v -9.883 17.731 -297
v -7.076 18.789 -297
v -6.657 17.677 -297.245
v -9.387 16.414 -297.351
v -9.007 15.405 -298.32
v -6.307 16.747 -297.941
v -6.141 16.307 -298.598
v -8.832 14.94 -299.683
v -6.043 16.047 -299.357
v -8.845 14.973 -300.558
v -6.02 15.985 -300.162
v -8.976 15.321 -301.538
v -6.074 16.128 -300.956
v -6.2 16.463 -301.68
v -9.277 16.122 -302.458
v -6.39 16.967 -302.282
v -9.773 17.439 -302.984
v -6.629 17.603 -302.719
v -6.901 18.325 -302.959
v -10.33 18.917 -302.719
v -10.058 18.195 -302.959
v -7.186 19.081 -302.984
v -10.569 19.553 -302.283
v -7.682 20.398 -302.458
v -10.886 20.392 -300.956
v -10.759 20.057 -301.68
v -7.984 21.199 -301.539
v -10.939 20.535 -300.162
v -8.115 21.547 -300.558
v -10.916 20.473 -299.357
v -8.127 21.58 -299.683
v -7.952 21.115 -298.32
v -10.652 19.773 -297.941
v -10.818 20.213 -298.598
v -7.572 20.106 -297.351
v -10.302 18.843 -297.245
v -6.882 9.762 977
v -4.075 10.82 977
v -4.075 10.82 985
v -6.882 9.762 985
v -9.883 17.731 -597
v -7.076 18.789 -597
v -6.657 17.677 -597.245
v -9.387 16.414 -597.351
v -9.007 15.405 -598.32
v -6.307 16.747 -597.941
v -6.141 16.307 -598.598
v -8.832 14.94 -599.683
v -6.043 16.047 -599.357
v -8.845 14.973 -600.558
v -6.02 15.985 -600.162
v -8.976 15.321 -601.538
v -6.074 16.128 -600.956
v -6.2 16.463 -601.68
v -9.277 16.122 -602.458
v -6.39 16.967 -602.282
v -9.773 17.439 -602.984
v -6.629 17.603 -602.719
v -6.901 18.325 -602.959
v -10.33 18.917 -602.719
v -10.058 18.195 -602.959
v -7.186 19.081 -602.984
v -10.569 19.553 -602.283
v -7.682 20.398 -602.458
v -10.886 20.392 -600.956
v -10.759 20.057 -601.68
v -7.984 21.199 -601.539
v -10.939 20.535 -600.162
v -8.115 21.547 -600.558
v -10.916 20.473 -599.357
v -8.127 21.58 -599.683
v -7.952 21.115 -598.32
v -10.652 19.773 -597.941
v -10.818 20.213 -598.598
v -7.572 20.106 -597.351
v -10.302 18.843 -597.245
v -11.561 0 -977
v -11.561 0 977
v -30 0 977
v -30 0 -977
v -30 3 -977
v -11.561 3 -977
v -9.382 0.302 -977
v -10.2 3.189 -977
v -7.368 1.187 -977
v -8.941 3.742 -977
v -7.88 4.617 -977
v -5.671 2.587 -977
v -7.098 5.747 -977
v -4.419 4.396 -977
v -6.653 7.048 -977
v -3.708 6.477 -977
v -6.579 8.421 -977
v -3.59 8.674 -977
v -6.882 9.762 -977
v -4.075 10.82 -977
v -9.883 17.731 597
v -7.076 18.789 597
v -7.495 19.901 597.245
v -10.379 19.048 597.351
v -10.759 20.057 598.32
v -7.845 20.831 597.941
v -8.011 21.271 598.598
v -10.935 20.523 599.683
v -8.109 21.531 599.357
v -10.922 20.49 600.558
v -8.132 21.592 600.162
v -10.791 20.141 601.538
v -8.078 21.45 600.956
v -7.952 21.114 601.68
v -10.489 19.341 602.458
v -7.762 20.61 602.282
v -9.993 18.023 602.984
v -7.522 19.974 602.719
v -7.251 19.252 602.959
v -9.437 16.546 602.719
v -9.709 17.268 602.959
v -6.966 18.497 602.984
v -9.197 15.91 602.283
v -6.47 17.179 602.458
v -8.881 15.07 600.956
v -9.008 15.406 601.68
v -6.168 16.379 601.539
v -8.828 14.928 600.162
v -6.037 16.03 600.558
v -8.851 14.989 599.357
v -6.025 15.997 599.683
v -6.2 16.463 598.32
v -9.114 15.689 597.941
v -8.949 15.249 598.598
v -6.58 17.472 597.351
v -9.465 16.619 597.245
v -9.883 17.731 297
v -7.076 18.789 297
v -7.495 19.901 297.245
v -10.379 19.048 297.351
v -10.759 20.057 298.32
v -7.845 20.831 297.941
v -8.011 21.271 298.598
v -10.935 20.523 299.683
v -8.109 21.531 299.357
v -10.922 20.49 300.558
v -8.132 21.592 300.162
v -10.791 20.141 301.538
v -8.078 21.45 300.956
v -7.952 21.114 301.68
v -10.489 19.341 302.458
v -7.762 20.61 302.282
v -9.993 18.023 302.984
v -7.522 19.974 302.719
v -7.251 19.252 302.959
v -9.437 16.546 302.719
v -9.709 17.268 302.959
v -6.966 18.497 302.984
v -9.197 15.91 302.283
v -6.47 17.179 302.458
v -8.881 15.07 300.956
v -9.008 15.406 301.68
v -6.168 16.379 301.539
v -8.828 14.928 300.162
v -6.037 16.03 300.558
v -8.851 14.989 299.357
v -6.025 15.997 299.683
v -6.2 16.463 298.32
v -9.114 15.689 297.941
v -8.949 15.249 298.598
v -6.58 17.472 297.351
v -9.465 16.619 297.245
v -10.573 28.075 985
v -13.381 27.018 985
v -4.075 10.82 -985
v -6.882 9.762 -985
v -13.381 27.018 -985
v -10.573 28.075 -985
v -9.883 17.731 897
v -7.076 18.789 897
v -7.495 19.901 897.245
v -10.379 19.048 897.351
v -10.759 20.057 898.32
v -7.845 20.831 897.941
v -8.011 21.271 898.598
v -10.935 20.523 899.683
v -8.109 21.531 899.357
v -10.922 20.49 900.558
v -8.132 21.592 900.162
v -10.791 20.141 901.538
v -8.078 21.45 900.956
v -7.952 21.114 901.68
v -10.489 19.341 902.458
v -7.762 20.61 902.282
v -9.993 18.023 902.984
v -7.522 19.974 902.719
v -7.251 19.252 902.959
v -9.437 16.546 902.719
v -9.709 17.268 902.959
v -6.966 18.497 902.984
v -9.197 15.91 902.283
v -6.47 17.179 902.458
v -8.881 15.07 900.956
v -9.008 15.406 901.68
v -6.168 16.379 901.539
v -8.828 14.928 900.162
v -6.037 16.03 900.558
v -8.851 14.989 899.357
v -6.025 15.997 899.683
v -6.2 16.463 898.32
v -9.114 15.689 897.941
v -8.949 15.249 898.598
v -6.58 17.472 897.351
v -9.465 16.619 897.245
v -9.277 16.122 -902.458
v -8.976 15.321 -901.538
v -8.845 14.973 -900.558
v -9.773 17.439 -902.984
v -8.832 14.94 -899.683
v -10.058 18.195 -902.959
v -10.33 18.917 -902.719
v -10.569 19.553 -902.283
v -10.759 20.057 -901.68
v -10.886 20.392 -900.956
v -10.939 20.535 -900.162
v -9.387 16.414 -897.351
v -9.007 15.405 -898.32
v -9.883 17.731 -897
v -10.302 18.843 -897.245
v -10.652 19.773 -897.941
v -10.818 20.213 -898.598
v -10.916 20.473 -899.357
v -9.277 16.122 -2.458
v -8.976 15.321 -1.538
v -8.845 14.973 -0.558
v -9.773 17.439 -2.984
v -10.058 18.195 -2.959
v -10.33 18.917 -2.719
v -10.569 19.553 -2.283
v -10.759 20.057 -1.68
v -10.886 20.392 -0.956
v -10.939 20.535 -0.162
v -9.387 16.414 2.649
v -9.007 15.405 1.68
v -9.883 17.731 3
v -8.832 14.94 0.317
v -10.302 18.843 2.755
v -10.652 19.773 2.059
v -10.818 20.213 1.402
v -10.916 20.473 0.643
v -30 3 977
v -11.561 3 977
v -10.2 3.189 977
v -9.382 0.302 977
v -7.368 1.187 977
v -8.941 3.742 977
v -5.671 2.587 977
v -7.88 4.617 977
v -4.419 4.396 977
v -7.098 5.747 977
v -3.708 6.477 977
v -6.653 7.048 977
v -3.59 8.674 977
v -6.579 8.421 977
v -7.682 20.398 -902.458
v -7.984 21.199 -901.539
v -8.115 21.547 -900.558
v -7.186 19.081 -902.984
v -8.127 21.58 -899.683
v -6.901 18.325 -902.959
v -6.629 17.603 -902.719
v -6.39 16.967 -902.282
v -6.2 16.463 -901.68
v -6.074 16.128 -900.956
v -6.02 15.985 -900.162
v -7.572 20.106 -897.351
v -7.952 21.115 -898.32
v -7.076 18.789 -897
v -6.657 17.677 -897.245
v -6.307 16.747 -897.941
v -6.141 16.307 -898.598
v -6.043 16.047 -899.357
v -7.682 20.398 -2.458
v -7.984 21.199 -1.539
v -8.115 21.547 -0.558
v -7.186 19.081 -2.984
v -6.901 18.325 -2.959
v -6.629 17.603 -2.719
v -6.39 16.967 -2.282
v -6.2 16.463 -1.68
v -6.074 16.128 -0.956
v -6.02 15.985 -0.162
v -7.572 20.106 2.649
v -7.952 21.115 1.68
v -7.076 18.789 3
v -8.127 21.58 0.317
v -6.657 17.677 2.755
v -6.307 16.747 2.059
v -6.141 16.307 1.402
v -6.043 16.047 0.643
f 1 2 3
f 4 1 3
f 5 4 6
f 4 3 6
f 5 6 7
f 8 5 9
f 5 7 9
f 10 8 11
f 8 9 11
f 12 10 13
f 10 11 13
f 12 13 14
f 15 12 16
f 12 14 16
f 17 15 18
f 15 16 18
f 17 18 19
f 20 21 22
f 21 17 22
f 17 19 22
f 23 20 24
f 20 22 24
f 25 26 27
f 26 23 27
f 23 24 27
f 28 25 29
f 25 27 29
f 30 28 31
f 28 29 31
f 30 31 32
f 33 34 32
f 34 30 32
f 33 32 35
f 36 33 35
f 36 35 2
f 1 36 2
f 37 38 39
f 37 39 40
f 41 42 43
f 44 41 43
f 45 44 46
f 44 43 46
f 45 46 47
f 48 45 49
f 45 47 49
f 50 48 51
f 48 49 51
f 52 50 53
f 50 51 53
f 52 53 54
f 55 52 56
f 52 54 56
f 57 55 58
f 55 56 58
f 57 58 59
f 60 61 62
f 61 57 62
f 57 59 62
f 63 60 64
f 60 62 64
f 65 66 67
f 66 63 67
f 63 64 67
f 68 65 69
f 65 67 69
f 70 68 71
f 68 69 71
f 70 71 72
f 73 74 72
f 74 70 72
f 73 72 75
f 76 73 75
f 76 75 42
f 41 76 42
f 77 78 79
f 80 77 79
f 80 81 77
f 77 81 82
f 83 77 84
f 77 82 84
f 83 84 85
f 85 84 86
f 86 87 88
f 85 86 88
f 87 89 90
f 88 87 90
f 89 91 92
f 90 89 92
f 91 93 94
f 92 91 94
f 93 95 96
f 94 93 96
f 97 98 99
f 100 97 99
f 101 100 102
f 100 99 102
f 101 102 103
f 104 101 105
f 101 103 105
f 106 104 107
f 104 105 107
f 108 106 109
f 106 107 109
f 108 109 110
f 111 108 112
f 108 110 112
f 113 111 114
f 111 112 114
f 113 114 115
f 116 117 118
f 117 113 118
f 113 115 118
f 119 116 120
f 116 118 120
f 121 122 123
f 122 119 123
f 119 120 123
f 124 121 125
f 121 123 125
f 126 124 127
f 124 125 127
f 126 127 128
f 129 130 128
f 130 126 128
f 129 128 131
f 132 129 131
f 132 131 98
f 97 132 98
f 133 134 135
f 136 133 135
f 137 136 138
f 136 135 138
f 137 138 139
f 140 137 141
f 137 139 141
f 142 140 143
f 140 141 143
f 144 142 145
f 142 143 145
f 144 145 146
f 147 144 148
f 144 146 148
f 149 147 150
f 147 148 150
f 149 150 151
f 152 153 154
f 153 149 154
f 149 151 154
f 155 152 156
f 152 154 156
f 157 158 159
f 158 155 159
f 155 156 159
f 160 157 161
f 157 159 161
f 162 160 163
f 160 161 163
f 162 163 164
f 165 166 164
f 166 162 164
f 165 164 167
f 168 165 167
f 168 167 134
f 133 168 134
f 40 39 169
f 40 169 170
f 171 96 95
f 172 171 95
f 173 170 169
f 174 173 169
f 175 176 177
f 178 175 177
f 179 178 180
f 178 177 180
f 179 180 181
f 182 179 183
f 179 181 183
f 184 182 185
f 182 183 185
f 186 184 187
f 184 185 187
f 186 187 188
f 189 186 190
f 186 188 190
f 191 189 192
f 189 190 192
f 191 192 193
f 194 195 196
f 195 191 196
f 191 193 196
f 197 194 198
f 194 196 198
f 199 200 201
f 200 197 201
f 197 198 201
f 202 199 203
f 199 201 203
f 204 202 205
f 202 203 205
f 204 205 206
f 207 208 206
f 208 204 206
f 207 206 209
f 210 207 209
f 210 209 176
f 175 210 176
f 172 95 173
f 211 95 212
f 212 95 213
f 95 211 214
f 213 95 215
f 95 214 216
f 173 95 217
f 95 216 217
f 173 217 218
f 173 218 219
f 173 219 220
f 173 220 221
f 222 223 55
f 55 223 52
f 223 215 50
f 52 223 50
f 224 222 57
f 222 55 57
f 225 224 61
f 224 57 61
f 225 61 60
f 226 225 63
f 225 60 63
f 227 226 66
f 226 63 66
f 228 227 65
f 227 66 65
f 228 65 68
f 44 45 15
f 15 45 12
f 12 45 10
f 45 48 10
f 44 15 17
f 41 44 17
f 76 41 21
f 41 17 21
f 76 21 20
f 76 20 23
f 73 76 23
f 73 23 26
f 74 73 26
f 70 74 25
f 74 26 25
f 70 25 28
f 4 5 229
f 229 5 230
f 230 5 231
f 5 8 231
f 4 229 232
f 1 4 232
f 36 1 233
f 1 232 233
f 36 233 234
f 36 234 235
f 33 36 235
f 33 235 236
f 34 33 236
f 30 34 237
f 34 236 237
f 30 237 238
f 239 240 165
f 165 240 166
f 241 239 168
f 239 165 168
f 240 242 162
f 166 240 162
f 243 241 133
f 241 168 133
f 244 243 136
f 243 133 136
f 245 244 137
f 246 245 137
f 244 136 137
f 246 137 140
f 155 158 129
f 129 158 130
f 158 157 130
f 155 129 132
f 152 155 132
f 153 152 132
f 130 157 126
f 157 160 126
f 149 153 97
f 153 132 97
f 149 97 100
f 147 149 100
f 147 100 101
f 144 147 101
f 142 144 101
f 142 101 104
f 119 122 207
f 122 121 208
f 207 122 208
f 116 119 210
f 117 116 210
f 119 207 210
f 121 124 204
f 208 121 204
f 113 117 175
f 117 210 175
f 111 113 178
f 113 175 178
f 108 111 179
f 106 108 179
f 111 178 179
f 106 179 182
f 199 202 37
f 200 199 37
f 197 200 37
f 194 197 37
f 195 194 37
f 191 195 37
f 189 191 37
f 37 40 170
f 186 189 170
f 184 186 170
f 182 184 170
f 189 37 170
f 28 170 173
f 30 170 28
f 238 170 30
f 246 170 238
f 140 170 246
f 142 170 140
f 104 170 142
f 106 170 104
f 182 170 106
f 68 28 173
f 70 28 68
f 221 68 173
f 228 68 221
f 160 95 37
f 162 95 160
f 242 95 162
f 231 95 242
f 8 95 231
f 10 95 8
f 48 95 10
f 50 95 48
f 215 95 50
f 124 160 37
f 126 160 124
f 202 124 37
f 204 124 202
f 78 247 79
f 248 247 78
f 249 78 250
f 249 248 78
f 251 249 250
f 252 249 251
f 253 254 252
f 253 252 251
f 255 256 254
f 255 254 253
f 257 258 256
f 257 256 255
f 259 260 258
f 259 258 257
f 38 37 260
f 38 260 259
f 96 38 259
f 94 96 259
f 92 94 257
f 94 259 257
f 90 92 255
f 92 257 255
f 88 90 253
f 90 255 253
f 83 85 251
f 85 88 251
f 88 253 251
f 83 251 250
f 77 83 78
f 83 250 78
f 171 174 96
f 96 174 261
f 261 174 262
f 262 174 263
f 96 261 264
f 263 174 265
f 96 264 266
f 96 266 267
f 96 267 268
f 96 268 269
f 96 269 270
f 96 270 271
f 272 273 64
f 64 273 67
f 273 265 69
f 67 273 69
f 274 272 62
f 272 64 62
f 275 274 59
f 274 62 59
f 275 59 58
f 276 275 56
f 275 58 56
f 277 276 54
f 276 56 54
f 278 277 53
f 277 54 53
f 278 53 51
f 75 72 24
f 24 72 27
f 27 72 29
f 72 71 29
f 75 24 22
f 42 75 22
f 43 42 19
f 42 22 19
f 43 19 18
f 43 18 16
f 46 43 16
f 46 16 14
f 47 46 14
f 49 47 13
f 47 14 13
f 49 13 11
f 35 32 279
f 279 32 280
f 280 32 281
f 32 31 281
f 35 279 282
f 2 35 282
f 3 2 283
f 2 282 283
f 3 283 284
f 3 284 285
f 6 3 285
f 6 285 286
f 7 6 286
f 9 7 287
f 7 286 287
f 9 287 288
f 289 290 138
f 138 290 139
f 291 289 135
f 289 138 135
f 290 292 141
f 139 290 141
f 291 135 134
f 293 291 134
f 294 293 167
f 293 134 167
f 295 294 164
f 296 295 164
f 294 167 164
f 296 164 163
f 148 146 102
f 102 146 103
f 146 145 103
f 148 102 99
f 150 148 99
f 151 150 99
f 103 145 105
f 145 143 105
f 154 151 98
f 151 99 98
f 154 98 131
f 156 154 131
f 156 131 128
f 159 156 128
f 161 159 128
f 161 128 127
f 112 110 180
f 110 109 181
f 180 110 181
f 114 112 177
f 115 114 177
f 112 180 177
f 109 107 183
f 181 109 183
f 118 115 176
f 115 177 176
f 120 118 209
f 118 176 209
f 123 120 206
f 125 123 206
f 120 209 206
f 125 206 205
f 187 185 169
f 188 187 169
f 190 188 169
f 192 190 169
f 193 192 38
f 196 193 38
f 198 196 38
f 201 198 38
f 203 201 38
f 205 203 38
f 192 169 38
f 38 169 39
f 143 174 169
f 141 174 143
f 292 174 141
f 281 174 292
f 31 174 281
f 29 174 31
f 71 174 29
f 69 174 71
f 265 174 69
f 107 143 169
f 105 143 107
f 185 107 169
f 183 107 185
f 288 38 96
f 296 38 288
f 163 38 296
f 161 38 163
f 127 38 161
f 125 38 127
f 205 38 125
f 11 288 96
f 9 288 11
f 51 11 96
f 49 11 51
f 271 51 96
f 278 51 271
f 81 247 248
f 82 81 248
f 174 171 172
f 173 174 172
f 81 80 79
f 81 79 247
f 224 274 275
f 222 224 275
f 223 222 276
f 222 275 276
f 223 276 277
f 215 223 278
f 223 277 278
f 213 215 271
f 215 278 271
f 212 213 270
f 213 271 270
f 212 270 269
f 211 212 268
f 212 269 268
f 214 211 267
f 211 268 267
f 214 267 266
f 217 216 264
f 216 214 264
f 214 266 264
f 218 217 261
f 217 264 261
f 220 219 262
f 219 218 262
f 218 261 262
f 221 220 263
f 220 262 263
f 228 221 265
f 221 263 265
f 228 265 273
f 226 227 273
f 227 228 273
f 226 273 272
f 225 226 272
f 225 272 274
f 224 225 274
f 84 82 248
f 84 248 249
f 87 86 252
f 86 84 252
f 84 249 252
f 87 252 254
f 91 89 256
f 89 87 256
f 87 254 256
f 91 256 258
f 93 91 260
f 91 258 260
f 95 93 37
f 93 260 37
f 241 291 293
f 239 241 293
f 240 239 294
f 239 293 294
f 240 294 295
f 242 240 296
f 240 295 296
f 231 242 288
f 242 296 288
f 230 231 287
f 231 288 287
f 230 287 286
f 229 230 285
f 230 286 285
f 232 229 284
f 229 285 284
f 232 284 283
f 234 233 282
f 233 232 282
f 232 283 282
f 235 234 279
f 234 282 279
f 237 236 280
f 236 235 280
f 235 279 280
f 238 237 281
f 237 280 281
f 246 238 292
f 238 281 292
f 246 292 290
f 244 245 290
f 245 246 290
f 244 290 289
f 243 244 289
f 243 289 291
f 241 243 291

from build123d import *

# Parameters (mm, degrees)
SM_BASE_FLANGE_1_DEPTH = 985
CUT_EXTRUDE_START      = 977
CUT_EXTRUDE_1_DEPTH    = 8
CUT_EXTRUDE_2_REACH    = 987.857
SKETCH_4_RX            = 3
SKETCH_4_RY            = 2.999814796


# Read off the part's stored shape, not the designer's step: Вырез-Вытянуть1
# Sheet-metal steps are written as plain solids
with BuildPart() as part:
    # Sketch 1 → Базовая кромка1 (new, symmetric)
    with BuildSketch(Plane.XY):
        with BuildLine():
            Line((-10.573213138, 28.075027408), (-4.074693371, 10.819523503))
            ThreePointArc((-4.074693371, 10.819523503), (-4.982758525, 3.447867974), (-11.561367346, 0))
            Line((-11.561367346, 0), (-30, 0))
            Line((-30, 0), (-30, 3))
            Line((-30, 3), (-11.561367346, 3))
            ThreePointArc((-11.561367346, 3), (-7.449736833, 5.154917483), (-6.882196111, 9.76220219))
            Line((-6.882196111, 9.76220219), (-13.380715879, 27.017706094))
            Line((-13.380715879, 27.017706094), (-10.573213138, 28.075027408))
        make_face()
    extrude(amount=SM_BASE_FLANGE_1_DEPTH, both=True)

    # Вырез-Вытянуть1 outline → Вырез-Вытянуть1 (cut)
    with BuildSketch(Plane.XY.offset(CUT_EXTRUDE_START)):
        with BuildLine():
            Line((-4.074693371, 10.819523503), (-6.882196111, 9.76220219))
            ThreePointArc((-6.882196111, 9.76220219), (-7.449736833, 5.154917483), (-11.561367346, 3))
            Line((-11.561367346, 3), (-30, 3))
            Line((-30, 3), (-30, 0))
            Line((-30, 0), (-11.561367346, 0))
            ThreePointArc((-11.561367346, 0), (-4.982758526, 3.447867973), (-4.074693371, 10.819523503))
        make_face()
    cut_extrude_1 = extrude(amount=CUT_EXTRUDE_1_DEPTH, mode=Mode.SUBTRACT)

    # Зеркальное отражение1: Вырез-Вытянуть1 across plane
    add(cut_extrude_1.mirror(Plane.XY), mode=Mode.SUBTRACT)

    # Эскиз4 → Вырез-Вытянуть2 (cut, up to next)
    with BuildSketch(Plane(origin=(0, 0, 0), x_dir=(0, 0, -1), z_dir=(0.9358342469192185, 0.3524404379368797, 0)), mode=Mode.PRIVATE) as cut_extrude_2_sk1:
        with Locations(Location((600, 20.076859002), (0, 0, 180))):
            Ellipse(SKETCH_4_RX, SKETCH_4_RY)
    cut_extrude_2_tool1 = extrude(cut_extrude_2_sk1.sketch, amount=-CUT_EXTRUDE_2_REACH, mode=Mode.PRIVATE) & part.part
    # Эскиз4 → Вырез-Вытянуть2 (cut, up to next)
    with BuildSketch(Plane(origin=(0, 0, 0), x_dir=(0, 0, -1), z_dir=(0.9358342469192185, 0.3524404379368797, 0)), mode=Mode.PRIVATE) as cut_extrude_2_sk2:
        with Locations(Location((300, 20.076859002), (0, 0, 180))):
            Ellipse(SKETCH_4_RX, SKETCH_4_RY)
    cut_extrude_2_tool2 = extrude(cut_extrude_2_sk2.sketch, amount=-CUT_EXTRUDE_2_REACH, mode=Mode.PRIVATE) & part.part
    # Эскиз4 → Вырез-Вытянуть2 (cut, up to next)
    with BuildSketch(Plane(origin=(0, 0, 0), x_dir=(0, 0, -1), z_dir=(0.9358342469192185, 0.3524404379368797, 0)), mode=Mode.PRIVATE) as cut_extrude_2_sk3:
        with Locations(Location((0, 20.076859002), (0, 0, 180))):
            Ellipse(SKETCH_4_RX, SKETCH_4_RY)
    cut_extrude_2_tool3 = extrude(cut_extrude_2_sk3.sketch, amount=-CUT_EXTRUDE_2_REACH, mode=Mode.PRIVATE) & part.part
    # Эскиз4 → Вырез-Вытянуть2 (cut, up to next)
    with BuildSketch(Plane(origin=(0, 0, 0), x_dir=(0, 0, -1), z_dir=(0.9358342469192185, 0.3524404379368797, 0)), mode=Mode.PRIVATE) as cut_extrude_2_sk4:
        with Locations((-300, 20.076859002)):
            Ellipse(SKETCH_4_RX, SKETCH_4_RY)
    cut_extrude_2_tool4 = extrude(cut_extrude_2_sk4.sketch, amount=-CUT_EXTRUDE_2_REACH, mode=Mode.PRIVATE) & part.part
    # Эскиз4 → Вырез-Вытянуть2 (cut, up to next)
    with BuildSketch(Plane(origin=(0, 0, 0), x_dir=(0, 0, -1), z_dir=(0.9358342469192185, 0.3524404379368797, 0)), mode=Mode.PRIVATE) as cut_extrude_2_sk5:
        with Locations((-600, 20.076859002)):
            Ellipse(SKETCH_4_RX, SKETCH_4_RY)
    cut_extrude_2_tool5 = extrude(cut_extrude_2_sk5.sketch, amount=-CUT_EXTRUDE_2_REACH, mode=Mode.PRIVATE) & part.part
    # Эскиз4 → Вырез-Вытянуть2 (cut, up to next)
    with BuildSketch(Plane(origin=(0, 0, 0), x_dir=(0, 0, -1), z_dir=(0.9358342469192185, 0.3524404379368797, 0)), mode=Mode.PRIVATE) as cut_extrude_2_sk6:
        with Locations((-900, 20.076859002)):
            Ellipse(SKETCH_4_RX, SKETCH_4_RY)
    cut_extrude_2_tool6 = extrude(cut_extrude_2_sk6.sketch, amount=-CUT_EXTRUDE_2_REACH, mode=Mode.PRIVATE) & part.part
    # Эскиз4 → Вырез-Вытянуть2 (cut, up to next)
    with BuildSketch(Plane(origin=(0, 0, 0), x_dir=(0, 0, -1), z_dir=(0.9358342469192185, 0.3524404379368797, 0)), mode=Mode.PRIVATE) as cut_extrude_2_sk7:
        with Locations(Location((900, 20.076859002), (0, 0, 180))):
            Ellipse(SKETCH_4_RX, SKETCH_4_RY)
    cut_extrude_2_tool7 = extrude(cut_extrude_2_sk7.sketch, amount=-CUT_EXTRUDE_2_REACH, mode=Mode.PRIVATE) & part.part
    add(cut_extrude_2_tool1.solids().sort_by_distance((-7.075897, 18.788612, -600))[0], mode=Mode.SUBTRACT)
    add(cut_extrude_2_tool2.solids().sort_by_distance((-7.075897, 18.788612, -300))[0], mode=Mode.SUBTRACT)
    add(cut_extrude_2_tool3.solids().sort_by_distance((-7.075897, 18.788612, 0))[0], mode=Mode.SUBTRACT)
    add(cut_extrude_2_tool4.solids().sort_by_distance((-7.075897, 18.788612, 300))[0], mode=Mode.SUBTRACT)
    add(cut_extrude_2_tool5.solids().sort_by_distance((-7.075897, 18.788612, 600))[0], mode=Mode.SUBTRACT)
    add(cut_extrude_2_tool6.solids().sort_by_distance((-7.075897, 18.788612, 900))[0], mode=Mode.SUBTRACT)
    add(cut_extrude_2_tool7.solids().sort_by_distance((-7.075897, 18.788612, -900))[0], mode=Mode.SUBTRACT)


solid = part.part
